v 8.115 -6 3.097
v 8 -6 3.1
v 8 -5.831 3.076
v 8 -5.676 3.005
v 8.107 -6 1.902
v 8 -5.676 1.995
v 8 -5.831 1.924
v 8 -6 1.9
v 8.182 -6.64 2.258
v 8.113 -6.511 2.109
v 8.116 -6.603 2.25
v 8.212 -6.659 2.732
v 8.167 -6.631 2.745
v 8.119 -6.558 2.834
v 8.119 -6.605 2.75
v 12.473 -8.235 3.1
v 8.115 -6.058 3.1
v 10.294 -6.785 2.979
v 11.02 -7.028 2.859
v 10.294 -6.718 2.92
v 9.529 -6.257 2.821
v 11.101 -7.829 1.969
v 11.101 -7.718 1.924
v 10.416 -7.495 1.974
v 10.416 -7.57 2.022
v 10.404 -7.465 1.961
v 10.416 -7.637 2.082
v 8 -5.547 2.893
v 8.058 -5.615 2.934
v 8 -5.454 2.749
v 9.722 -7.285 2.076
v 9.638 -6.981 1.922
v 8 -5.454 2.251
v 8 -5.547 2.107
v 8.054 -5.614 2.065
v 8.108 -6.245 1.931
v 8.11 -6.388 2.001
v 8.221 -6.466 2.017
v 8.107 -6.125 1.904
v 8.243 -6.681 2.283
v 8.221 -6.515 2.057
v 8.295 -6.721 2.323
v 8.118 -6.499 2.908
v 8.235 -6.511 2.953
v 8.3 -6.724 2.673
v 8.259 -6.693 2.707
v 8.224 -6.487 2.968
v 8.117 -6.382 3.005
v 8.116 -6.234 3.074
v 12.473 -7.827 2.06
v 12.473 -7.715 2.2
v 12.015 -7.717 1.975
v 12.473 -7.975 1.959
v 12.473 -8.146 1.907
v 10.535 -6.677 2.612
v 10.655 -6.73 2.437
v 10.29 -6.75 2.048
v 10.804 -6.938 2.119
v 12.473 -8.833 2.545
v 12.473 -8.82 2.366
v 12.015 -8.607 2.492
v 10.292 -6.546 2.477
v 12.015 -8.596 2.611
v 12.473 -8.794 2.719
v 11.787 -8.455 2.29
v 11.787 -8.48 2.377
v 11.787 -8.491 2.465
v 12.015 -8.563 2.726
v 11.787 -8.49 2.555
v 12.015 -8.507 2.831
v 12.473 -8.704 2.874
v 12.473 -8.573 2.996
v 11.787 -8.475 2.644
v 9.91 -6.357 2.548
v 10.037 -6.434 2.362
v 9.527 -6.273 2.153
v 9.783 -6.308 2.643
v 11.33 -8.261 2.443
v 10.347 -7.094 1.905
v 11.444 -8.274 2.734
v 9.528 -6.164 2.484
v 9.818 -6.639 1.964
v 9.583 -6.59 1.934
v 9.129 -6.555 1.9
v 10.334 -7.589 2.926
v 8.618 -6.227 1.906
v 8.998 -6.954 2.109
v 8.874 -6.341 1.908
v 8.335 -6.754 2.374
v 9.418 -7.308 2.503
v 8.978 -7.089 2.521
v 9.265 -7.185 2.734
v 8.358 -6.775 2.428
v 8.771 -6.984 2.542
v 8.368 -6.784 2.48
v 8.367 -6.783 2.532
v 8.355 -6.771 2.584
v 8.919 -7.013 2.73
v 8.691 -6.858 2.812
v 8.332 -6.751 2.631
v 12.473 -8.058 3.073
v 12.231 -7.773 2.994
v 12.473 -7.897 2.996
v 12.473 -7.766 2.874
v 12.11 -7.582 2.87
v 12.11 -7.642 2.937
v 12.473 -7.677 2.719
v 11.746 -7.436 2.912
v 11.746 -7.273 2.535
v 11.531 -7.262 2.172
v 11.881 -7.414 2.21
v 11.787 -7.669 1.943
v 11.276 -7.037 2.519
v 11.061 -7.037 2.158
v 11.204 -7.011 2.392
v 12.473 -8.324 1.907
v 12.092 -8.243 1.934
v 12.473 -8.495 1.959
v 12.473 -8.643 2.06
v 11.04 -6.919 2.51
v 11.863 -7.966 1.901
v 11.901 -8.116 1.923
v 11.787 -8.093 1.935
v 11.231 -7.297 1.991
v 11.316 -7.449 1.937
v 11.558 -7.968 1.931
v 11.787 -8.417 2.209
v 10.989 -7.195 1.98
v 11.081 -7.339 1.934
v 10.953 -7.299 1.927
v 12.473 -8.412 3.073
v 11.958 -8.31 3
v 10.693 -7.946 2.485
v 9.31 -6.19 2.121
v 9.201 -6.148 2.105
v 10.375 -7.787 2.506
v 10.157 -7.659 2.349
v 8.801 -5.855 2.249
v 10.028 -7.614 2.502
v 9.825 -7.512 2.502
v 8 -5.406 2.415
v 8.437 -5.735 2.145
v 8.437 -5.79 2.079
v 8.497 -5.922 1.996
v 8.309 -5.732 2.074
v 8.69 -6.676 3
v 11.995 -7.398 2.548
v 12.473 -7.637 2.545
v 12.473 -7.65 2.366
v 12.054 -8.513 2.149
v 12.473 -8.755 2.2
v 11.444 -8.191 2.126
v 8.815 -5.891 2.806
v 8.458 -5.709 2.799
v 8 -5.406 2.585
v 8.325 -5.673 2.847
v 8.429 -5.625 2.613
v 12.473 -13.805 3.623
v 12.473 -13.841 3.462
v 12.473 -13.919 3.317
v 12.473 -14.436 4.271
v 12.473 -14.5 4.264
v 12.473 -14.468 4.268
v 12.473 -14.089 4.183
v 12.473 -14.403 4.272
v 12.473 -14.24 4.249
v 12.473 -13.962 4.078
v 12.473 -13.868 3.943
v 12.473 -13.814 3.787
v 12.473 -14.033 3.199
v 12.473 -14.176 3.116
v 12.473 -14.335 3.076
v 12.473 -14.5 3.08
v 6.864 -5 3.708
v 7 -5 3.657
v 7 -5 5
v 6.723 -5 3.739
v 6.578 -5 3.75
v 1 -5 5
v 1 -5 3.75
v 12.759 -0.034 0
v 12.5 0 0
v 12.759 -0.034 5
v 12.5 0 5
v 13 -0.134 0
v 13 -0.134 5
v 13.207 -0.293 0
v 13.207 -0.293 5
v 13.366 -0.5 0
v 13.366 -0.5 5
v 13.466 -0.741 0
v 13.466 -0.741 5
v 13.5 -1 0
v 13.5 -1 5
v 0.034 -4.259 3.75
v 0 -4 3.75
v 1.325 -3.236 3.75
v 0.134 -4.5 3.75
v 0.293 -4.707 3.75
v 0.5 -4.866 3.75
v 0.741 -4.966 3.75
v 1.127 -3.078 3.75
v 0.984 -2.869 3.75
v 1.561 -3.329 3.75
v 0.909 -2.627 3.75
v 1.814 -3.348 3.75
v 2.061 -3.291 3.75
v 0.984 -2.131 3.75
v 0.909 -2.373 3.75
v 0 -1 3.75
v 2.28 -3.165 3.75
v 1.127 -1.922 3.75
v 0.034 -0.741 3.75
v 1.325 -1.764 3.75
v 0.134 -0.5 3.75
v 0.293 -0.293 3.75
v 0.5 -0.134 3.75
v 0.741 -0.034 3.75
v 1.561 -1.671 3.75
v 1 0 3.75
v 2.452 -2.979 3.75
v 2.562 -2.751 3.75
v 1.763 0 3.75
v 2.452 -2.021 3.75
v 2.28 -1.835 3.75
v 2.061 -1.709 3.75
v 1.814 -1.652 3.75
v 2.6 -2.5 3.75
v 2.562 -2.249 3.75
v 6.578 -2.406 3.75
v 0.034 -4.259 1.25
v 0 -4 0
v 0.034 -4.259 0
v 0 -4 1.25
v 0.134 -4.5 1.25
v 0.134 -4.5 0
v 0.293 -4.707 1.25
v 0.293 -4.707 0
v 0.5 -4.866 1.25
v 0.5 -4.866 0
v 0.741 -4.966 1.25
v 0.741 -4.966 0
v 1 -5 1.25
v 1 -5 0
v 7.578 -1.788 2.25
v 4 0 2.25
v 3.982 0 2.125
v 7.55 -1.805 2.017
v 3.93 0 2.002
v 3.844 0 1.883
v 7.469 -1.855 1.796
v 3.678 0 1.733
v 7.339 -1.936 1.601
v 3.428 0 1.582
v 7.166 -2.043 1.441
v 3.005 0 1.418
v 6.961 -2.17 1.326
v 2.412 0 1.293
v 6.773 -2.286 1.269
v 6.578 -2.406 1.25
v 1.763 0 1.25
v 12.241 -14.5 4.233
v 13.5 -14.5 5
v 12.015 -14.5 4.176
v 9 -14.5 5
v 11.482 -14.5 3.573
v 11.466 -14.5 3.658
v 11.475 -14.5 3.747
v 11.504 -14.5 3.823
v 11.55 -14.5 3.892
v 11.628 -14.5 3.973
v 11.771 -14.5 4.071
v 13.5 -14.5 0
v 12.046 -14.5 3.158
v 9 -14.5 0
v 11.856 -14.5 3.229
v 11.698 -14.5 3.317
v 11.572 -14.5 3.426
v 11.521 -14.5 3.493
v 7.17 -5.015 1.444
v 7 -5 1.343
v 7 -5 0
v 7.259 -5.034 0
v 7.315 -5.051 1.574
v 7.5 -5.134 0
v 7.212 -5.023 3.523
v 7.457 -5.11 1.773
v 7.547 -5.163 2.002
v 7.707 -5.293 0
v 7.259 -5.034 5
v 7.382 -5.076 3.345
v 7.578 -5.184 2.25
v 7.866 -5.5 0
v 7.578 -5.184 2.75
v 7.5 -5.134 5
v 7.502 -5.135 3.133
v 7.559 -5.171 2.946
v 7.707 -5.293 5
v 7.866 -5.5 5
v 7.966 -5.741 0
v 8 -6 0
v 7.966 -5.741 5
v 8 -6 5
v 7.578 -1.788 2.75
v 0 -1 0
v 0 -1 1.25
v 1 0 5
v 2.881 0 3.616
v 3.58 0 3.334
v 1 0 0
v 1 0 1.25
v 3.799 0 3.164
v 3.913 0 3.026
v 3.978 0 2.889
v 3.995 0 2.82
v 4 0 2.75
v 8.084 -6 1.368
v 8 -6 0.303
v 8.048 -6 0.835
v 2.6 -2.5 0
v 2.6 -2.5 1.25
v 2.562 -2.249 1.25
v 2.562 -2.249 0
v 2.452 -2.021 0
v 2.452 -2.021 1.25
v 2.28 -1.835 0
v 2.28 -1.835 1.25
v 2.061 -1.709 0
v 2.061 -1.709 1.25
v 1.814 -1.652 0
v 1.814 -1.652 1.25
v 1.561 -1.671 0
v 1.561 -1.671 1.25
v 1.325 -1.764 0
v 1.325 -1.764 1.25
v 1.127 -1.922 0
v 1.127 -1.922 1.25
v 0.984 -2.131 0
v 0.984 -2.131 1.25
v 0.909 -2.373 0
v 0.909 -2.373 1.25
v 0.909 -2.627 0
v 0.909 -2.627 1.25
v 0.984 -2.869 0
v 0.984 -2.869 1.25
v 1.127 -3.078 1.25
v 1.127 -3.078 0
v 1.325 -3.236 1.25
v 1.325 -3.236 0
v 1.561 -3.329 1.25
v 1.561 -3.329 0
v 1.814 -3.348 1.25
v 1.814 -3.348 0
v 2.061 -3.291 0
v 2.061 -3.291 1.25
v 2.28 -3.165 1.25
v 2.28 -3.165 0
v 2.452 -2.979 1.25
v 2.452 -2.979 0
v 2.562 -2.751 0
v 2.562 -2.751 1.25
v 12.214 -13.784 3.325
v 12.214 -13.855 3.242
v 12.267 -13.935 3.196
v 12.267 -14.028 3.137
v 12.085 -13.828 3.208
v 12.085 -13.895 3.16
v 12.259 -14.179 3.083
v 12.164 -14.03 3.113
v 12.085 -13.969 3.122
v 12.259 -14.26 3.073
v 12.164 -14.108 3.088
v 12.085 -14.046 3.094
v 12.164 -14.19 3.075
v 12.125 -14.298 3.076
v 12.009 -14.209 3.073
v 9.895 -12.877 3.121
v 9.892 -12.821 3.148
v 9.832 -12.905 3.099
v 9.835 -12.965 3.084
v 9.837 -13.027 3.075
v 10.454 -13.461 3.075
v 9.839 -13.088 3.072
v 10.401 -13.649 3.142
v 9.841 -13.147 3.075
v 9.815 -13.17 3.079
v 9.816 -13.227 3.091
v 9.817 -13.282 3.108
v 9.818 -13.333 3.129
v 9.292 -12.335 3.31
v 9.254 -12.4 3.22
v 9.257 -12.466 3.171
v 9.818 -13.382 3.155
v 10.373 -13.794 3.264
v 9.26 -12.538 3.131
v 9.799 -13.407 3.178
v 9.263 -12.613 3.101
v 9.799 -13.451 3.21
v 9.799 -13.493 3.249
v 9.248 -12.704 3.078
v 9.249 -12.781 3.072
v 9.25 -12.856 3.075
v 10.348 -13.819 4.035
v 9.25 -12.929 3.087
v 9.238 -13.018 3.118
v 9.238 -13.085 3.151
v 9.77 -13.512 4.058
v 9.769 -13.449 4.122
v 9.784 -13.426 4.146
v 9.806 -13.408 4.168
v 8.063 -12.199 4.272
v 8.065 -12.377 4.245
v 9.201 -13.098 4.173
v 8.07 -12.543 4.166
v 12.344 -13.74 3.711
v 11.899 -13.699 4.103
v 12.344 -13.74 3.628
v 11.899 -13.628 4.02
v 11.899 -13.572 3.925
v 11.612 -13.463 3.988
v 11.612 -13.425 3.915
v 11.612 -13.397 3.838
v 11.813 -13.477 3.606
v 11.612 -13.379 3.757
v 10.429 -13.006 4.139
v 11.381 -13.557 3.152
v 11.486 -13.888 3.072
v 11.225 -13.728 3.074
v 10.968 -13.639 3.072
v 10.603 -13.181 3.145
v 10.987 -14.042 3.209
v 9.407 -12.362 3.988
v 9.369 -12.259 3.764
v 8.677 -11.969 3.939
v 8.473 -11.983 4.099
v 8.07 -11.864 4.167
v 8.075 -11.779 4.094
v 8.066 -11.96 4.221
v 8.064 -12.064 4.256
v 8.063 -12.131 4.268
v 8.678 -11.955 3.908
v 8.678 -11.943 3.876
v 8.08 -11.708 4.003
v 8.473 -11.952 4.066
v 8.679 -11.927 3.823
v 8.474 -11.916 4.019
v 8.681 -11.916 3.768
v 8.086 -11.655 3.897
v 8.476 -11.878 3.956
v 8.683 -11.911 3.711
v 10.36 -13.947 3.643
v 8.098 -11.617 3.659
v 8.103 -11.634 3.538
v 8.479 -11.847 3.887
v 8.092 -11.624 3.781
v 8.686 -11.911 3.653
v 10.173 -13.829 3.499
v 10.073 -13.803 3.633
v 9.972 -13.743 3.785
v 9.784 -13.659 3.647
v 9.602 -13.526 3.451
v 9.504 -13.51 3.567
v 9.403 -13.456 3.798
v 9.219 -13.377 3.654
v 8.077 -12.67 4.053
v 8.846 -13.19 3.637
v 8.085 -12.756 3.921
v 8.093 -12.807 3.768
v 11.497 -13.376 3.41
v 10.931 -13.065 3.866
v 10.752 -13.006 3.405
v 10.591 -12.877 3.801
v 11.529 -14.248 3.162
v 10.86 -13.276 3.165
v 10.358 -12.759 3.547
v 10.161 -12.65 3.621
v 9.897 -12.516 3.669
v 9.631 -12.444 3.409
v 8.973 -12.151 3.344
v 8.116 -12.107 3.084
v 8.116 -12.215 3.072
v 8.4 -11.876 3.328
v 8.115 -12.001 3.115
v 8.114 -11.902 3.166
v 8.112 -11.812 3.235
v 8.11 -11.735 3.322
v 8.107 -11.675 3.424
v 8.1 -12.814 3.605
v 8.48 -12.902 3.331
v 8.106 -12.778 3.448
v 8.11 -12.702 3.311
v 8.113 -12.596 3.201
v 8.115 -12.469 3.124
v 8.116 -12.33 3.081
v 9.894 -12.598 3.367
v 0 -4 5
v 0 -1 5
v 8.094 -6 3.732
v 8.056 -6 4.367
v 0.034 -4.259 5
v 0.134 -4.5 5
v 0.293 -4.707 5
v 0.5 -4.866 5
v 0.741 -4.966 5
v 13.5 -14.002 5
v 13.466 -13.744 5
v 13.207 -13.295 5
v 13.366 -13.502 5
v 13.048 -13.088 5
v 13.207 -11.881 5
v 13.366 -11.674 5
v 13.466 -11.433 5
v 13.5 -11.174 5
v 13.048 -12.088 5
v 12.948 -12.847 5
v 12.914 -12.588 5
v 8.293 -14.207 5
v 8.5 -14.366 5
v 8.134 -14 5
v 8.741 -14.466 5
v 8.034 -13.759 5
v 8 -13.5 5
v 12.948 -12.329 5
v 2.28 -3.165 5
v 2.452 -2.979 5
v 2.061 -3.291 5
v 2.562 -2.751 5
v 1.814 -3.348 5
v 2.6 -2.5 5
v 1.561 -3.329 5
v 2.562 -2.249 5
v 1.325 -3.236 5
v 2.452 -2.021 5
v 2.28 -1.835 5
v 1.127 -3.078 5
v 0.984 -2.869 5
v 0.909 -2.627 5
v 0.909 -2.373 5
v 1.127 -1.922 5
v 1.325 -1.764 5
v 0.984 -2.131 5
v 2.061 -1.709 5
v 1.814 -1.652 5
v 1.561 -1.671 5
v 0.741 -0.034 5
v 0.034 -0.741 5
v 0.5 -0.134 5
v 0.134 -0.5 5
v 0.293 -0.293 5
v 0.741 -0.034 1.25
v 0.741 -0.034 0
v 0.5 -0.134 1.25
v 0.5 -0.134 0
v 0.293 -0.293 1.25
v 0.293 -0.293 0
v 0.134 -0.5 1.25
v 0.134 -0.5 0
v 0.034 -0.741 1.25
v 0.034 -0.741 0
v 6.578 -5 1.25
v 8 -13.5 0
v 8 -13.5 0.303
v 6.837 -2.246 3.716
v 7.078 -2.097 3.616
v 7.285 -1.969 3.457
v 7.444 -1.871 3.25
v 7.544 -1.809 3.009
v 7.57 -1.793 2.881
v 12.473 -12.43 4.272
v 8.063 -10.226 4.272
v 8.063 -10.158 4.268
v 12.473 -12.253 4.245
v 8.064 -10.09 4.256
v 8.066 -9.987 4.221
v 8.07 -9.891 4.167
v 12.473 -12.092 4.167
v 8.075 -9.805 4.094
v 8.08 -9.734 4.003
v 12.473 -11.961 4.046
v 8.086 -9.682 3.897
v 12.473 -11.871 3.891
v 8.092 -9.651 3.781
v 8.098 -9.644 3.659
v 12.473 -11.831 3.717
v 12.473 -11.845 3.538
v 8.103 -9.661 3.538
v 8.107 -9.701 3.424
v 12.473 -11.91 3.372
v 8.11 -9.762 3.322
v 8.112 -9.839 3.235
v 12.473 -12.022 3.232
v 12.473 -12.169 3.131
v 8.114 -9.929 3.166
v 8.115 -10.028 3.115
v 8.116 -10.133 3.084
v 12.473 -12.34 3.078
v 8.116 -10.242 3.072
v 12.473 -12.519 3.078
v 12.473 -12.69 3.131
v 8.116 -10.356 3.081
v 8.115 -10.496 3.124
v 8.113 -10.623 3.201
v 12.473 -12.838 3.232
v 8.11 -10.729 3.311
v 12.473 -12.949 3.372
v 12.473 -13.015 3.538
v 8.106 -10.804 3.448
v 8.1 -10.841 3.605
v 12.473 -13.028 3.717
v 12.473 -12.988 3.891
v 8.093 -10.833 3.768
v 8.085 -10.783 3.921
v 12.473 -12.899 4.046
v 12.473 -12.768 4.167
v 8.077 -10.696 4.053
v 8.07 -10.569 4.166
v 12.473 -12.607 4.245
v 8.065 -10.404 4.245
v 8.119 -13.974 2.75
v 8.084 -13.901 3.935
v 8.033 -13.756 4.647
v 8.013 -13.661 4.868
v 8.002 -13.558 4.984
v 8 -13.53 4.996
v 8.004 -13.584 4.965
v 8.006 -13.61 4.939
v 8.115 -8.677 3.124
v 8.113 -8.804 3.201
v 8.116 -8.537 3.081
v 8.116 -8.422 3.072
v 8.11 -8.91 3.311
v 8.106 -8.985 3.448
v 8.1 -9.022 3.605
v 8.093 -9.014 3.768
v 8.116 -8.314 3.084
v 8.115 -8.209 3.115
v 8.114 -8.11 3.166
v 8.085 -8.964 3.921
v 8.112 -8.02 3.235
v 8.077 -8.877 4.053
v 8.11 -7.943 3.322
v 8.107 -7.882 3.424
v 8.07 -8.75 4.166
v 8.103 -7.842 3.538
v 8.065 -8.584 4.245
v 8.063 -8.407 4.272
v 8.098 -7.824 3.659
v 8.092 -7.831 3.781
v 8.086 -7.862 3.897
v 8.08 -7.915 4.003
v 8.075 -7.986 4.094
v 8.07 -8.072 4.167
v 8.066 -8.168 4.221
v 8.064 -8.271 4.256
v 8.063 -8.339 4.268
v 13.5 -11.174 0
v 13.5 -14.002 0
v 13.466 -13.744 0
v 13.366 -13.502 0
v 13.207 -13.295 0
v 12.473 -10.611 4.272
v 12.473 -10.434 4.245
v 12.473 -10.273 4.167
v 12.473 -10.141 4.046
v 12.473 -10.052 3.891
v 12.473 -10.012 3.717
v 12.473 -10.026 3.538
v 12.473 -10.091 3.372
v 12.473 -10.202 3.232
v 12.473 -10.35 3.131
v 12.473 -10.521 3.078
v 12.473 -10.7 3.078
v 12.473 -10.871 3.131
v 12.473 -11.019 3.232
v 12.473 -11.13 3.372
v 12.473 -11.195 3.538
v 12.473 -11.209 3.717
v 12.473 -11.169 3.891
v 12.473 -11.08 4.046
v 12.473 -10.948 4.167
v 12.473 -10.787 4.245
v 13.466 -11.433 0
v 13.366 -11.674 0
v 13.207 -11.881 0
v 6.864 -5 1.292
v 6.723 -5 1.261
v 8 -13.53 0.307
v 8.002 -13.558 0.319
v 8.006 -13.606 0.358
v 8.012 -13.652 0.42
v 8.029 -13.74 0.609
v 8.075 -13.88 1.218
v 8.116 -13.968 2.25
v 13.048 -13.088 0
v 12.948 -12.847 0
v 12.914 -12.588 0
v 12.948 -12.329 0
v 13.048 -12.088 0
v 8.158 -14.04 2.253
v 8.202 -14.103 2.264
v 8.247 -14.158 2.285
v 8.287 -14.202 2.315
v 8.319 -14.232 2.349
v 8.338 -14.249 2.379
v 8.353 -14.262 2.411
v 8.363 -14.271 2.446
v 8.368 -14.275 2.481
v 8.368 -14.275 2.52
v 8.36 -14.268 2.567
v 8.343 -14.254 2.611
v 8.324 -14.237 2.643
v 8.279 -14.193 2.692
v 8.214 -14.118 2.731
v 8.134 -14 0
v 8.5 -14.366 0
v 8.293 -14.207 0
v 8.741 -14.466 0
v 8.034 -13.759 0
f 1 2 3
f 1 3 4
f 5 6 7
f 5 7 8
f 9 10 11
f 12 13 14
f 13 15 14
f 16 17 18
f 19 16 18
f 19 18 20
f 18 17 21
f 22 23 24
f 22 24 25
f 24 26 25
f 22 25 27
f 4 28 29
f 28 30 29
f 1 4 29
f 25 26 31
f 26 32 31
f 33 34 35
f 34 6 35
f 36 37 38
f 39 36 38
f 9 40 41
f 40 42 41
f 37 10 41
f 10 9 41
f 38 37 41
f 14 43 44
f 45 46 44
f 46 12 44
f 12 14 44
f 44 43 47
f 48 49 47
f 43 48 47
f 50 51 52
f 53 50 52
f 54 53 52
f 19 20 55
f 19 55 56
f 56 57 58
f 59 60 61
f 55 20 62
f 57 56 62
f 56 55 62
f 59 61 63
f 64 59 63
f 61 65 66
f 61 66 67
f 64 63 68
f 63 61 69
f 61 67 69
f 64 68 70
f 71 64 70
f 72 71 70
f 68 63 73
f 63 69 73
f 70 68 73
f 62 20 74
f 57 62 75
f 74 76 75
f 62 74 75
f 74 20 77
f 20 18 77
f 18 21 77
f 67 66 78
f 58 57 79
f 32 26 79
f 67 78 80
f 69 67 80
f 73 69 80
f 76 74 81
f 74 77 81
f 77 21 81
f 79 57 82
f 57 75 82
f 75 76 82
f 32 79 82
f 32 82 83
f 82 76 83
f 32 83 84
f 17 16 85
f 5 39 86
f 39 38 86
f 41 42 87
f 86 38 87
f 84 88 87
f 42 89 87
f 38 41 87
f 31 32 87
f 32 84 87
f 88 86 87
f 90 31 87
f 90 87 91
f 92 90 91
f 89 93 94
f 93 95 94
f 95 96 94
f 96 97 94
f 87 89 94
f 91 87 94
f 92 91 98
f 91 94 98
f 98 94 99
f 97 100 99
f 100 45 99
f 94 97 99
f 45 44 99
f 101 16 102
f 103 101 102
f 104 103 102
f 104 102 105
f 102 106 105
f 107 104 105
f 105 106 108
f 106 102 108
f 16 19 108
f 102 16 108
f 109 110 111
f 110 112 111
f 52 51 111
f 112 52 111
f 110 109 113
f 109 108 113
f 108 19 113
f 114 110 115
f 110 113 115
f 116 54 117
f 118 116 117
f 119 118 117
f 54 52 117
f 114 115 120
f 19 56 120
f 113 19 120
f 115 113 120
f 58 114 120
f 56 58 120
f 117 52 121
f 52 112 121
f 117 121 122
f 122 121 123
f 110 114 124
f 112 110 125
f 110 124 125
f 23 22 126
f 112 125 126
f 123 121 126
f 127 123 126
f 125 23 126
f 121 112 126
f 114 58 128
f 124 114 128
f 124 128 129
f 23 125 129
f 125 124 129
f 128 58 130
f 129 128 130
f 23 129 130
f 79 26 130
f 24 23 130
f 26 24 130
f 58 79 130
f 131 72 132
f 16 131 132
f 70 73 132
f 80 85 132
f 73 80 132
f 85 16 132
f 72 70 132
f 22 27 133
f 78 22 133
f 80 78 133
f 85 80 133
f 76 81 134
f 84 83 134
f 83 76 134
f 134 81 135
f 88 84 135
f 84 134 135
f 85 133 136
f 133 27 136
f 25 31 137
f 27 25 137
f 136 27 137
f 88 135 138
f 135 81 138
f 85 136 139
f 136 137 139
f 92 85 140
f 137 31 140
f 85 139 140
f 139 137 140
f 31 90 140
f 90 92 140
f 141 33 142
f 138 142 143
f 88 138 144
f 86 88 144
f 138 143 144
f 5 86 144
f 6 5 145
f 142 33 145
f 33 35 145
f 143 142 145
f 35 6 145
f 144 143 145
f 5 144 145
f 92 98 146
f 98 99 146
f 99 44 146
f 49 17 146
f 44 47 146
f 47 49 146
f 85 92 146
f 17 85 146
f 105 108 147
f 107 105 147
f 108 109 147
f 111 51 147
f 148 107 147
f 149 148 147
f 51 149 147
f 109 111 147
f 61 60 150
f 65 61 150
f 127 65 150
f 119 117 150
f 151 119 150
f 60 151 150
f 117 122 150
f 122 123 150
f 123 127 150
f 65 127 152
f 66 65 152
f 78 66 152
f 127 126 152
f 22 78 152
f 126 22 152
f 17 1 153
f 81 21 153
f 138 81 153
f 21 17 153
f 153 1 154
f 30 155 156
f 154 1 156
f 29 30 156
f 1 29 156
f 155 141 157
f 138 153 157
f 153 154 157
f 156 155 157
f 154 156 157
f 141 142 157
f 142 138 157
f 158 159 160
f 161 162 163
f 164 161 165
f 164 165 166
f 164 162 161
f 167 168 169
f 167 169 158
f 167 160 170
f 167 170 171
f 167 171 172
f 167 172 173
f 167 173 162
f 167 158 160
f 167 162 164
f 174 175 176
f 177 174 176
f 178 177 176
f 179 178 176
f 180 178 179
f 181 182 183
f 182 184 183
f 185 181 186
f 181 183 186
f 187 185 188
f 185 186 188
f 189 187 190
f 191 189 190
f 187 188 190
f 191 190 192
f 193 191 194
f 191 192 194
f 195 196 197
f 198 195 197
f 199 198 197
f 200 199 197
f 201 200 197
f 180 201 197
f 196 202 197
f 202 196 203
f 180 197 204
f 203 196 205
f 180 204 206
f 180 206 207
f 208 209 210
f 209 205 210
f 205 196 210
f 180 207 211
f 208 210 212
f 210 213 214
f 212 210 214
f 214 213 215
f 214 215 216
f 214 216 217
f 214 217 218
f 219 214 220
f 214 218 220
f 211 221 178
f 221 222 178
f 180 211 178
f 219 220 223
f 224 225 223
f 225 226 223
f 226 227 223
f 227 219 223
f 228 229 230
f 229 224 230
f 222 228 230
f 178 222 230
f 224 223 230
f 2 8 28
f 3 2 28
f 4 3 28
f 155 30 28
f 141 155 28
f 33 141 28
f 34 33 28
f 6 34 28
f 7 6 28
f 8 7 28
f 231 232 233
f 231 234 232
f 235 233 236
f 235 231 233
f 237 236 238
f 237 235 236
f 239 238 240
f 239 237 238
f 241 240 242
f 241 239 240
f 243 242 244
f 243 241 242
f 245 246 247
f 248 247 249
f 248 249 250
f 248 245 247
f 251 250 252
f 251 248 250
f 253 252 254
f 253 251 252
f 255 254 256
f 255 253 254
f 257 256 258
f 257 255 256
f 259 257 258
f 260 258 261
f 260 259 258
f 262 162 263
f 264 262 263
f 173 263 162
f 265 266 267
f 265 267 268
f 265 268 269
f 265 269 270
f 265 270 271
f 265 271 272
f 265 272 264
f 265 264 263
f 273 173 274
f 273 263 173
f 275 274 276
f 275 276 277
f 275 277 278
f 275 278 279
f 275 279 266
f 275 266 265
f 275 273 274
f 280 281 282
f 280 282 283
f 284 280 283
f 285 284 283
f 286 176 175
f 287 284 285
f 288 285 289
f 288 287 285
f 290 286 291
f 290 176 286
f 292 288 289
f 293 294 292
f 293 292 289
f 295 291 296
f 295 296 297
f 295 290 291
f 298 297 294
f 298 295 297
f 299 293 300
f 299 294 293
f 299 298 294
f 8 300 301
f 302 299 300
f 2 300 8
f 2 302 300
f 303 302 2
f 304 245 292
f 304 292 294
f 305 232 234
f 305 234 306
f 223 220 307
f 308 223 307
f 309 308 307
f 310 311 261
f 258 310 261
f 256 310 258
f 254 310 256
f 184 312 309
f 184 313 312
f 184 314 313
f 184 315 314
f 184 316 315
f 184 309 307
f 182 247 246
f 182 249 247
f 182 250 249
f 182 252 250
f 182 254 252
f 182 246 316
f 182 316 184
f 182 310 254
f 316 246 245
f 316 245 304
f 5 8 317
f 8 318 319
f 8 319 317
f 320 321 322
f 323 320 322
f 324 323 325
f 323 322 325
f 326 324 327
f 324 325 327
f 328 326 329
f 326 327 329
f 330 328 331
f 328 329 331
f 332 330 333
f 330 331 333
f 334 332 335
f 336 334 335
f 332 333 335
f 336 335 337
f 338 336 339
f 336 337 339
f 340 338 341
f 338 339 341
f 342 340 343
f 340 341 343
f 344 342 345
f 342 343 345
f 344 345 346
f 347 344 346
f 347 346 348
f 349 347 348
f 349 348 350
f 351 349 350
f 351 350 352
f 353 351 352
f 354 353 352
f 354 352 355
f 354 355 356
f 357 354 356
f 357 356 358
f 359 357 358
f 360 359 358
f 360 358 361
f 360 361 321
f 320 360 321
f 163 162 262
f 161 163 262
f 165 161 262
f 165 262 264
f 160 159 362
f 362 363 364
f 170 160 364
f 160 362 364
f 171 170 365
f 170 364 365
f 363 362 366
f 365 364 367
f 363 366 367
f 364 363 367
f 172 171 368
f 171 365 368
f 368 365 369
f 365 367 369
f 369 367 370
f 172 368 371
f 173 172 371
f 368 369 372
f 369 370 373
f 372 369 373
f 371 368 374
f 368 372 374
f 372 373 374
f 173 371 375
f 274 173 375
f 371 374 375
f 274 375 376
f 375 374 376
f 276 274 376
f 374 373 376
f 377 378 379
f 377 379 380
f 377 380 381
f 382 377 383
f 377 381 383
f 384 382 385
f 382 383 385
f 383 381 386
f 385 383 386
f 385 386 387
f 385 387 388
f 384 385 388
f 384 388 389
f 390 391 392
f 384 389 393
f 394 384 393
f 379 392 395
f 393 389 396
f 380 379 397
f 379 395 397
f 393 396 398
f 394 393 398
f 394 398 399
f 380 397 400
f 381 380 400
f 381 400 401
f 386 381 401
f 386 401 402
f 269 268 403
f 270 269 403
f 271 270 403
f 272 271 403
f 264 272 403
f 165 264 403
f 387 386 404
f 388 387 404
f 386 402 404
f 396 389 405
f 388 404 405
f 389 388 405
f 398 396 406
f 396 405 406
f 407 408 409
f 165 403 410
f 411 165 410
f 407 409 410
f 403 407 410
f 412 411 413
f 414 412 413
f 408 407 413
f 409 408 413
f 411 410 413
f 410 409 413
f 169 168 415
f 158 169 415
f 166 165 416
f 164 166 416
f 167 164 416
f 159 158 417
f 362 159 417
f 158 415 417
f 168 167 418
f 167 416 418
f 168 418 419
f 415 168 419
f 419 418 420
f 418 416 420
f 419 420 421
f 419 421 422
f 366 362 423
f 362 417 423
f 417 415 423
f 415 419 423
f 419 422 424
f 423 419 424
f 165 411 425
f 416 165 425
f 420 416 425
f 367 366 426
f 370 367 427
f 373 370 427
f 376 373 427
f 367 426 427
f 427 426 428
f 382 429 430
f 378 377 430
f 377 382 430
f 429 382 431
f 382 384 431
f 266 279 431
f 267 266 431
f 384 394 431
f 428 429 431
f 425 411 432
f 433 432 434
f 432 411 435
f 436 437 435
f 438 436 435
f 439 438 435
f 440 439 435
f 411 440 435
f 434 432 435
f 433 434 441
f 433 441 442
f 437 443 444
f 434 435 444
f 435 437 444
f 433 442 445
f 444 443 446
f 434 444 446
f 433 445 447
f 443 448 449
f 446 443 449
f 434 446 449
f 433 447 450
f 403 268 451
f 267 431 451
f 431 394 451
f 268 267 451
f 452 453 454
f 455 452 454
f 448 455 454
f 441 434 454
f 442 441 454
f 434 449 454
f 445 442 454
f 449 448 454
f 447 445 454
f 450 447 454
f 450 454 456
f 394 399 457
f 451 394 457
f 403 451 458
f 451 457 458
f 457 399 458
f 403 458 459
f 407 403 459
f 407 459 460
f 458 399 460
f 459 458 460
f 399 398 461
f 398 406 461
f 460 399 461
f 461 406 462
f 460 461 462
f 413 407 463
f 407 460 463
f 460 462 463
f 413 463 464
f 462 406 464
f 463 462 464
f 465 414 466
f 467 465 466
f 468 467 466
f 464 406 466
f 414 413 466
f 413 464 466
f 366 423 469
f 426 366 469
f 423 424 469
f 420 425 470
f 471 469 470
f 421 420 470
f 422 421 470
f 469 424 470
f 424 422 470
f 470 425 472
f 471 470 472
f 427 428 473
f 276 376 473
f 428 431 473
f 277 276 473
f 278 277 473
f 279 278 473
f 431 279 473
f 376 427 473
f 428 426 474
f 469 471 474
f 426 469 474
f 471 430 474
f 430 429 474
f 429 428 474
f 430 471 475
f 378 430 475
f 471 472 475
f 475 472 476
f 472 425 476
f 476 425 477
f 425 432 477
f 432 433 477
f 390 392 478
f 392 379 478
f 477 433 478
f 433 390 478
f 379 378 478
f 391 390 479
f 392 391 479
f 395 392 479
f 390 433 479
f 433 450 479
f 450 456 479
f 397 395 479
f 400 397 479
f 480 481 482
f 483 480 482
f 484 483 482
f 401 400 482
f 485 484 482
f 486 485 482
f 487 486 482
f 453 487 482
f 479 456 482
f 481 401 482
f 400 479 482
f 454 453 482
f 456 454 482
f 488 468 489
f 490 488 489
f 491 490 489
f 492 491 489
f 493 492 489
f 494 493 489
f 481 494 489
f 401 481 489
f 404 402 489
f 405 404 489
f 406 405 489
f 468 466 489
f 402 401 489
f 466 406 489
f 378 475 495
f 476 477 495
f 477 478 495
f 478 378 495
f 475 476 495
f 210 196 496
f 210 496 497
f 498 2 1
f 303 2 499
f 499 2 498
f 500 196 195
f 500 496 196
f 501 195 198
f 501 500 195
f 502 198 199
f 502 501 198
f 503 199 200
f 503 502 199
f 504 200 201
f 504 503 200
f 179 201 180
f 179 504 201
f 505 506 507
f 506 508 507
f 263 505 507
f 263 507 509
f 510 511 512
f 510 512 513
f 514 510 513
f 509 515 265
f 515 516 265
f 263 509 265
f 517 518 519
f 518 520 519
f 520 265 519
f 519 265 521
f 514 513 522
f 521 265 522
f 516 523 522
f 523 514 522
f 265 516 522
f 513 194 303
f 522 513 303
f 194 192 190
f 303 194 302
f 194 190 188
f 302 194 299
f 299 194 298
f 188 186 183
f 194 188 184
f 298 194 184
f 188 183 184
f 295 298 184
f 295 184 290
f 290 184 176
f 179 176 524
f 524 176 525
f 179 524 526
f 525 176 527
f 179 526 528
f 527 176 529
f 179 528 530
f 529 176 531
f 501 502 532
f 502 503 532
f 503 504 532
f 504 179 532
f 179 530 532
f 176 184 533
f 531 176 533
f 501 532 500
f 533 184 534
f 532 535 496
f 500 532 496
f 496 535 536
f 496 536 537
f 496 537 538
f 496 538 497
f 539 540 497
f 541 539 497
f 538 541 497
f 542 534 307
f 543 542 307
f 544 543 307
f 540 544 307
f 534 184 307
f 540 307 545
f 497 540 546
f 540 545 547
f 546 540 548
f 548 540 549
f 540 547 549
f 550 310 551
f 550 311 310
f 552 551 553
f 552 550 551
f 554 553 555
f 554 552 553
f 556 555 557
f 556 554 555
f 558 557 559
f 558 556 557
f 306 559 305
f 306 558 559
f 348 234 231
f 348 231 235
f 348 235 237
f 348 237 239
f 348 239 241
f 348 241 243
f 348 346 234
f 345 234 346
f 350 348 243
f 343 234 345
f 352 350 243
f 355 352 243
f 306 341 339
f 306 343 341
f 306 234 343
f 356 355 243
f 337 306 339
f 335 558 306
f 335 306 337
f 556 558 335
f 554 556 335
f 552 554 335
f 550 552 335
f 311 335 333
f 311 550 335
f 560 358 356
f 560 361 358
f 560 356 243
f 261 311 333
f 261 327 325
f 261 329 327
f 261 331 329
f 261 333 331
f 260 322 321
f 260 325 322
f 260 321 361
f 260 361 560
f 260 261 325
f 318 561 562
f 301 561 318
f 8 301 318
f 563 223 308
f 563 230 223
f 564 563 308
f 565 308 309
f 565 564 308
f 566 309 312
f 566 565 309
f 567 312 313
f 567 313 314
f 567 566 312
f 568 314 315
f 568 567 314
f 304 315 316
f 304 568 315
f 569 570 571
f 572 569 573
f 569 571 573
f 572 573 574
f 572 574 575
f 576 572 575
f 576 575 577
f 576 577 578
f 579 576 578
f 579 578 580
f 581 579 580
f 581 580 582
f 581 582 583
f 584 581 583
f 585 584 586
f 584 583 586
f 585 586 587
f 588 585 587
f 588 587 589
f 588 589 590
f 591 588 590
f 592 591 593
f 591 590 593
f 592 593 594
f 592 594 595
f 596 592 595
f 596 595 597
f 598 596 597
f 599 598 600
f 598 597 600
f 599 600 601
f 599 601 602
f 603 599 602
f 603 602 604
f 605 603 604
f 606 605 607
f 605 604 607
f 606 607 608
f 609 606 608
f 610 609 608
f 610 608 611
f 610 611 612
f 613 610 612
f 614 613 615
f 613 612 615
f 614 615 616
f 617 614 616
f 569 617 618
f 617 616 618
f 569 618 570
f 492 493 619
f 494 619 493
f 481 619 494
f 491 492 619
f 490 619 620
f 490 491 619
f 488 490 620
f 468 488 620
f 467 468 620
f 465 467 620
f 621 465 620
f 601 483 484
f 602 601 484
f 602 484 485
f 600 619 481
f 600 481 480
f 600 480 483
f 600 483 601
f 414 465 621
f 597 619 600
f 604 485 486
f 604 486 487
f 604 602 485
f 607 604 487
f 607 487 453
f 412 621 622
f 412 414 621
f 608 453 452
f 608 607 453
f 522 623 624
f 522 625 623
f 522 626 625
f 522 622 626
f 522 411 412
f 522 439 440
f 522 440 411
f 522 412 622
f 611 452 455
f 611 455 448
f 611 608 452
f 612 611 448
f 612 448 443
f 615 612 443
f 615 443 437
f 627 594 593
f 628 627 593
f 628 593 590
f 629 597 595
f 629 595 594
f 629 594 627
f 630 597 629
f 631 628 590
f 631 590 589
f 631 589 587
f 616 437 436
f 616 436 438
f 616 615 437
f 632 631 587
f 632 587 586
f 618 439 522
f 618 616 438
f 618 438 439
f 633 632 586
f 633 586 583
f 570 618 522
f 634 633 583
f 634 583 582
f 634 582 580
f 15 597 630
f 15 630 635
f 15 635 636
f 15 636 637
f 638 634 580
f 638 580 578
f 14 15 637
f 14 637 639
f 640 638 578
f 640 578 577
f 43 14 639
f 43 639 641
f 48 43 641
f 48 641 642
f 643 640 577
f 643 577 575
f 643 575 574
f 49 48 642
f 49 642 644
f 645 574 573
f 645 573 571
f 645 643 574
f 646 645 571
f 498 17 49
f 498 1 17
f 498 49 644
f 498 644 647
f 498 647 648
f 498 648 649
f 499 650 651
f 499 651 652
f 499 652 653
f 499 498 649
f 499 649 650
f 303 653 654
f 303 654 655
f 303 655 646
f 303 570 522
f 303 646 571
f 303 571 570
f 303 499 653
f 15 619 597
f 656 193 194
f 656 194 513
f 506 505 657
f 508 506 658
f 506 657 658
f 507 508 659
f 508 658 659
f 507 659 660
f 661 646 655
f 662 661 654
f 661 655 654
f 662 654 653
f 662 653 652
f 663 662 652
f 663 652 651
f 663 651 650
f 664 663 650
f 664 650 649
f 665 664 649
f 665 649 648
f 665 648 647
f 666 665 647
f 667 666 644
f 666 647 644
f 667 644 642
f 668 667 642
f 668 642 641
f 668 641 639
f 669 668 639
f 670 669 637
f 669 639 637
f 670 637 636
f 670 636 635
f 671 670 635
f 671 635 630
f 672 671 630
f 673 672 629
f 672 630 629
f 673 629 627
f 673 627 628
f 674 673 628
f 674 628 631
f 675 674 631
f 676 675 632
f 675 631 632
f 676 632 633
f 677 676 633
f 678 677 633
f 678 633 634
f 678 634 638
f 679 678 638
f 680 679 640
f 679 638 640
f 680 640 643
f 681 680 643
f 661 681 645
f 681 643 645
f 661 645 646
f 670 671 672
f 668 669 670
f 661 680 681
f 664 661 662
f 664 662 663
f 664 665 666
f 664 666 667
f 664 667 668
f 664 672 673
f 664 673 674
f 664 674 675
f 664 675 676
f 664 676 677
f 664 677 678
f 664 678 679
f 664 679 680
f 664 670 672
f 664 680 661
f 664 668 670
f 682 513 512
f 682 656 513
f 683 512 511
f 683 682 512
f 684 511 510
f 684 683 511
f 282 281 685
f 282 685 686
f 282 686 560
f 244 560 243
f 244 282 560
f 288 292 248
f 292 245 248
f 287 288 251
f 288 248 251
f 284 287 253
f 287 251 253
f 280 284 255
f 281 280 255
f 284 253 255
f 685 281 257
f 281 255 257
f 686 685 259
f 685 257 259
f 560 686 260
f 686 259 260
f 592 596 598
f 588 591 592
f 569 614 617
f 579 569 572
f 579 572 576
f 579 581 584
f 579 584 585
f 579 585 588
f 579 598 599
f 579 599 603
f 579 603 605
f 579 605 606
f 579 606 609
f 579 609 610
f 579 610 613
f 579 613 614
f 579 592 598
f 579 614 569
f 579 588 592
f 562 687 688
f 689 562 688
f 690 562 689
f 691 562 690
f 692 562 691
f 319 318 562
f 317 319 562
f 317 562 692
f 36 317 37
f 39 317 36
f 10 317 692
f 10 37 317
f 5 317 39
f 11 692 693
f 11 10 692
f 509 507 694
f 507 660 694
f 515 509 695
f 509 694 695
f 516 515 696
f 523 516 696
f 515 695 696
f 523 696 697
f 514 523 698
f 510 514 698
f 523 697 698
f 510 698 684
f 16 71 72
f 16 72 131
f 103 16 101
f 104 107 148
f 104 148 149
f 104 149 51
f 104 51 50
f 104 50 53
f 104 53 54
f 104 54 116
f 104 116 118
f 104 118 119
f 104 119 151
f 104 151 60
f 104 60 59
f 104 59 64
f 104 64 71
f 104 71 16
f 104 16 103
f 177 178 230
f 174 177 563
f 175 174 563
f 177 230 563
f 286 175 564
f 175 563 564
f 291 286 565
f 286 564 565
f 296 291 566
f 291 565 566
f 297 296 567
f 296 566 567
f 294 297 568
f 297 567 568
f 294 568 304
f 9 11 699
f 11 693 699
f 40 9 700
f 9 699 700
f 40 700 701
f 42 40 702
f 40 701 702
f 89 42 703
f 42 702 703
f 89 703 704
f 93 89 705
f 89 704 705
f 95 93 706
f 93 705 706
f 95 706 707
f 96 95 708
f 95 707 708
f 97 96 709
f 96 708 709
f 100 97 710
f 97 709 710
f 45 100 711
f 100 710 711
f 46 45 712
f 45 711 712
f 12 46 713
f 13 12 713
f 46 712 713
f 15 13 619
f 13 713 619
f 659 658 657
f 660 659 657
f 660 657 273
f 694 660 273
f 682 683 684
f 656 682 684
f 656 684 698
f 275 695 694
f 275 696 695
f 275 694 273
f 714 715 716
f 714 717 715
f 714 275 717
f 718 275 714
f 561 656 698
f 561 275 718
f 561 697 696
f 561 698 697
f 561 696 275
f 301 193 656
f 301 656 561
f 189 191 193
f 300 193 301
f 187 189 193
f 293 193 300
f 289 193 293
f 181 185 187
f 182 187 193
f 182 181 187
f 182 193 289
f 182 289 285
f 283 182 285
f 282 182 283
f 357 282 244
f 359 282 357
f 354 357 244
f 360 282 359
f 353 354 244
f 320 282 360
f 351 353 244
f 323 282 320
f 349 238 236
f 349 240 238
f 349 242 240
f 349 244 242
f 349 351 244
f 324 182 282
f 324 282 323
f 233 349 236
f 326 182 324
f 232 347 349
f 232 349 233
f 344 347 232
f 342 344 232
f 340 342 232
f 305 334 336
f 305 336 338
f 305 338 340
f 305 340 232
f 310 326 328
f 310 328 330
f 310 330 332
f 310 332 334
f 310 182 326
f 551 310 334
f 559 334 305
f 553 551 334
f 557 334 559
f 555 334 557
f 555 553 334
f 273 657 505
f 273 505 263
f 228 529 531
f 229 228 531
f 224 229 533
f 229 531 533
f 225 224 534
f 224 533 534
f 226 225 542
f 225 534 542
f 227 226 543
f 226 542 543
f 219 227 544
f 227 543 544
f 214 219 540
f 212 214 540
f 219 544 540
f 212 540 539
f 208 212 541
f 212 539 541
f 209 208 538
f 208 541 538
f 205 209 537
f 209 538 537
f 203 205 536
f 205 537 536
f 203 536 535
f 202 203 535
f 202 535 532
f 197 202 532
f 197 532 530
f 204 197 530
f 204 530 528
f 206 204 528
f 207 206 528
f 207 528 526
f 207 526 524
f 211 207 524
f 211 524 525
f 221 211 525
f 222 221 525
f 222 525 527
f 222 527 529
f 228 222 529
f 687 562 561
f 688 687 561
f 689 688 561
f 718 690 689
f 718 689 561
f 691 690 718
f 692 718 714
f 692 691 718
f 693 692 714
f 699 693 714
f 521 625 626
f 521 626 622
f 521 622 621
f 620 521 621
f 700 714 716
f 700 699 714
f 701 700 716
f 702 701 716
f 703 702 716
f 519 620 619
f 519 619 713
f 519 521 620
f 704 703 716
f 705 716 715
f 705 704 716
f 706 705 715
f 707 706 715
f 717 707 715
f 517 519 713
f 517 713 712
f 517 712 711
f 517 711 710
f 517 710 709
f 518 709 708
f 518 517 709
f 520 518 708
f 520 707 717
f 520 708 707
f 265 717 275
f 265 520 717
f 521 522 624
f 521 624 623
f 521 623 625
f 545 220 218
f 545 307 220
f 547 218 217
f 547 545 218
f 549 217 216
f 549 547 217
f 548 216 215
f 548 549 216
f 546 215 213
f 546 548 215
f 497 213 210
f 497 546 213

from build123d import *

# Parameters (mm, degrees)
BOSS_EXTRUDE1_DEPTH = 5
SKETCH4_R           = 0.85
CUT_EXTRUDE3_DEPTH  = 21.432816742
SKETCH5_W           = 4
SKETCH5_H           = 2.5
CUT_EXTRUDE4_DEPTH  = 13
FILLET4_R           = 1
CUT_EXTRUDE5_DEPTH  = 21.432816742
FILLET6_R           = 1
CUT_EXTRUDE6_START  = -8.5
CUT_EXTRUDE6_DEPTH  = 7.974174509
SKETCH11_W          = 2.5
SKETCH11_H          = 5
CUT_EXTRUDE8_DEPTH  = 4
SKETCH12_R          = 0.6
CUT_EXTRUDE9_DEPTH  = 5
SKETCH9_R           = 0.25
CUT_EXTRUDE10_DEPTH = 8.5
FILLET7_R           = 1


# Read off the part's stored shape, not the designer's step: Cut-Extrude6
with BuildPart() as part:
    # Sketch1 → Boss-Extrude1 (new body)
    with BuildSketch(Plane.XY):
        Polygon((0, 0), (13.5, 0), (13.5, -14.5), (8, -14.5), (8, -5), (0, -5), align=None)
    extrude(amount=BOSS_EXTRUDE1_DEPTH)

    # Sketch4 → Cut-Extrude3 (cut, through all)
    with BuildSketch(Plane.XY.offset(5)):
        with Locations((1.75, -2.5)):
            Circle(SKETCH4_R)
    extrude(amount=-CUT_EXTRUDE3_DEPTH, mode=Mode.SUBTRACT)

    # Sketch5 → Cut-Extrude4 (cut)
    with BuildSketch(Plane(origin=(0, 0, 0), x_dir=(1, 0, 0), z_dir=(0, 1, 0))):
        with Locations((2, -2.5)):
            Rectangle(SKETCH5_W, SKETCH5_H)
    extrude(amount=-CUT_EXTRUDE4_DEPTH, mode=Mode.SUBTRACT)

    # Fillet4
    fillet4_edges = [part.edges().sort_by_distance(p)[0] for p in [
        (0, 0, 4.375),
        (0, -5, 4.375),
        (0, 0, 0.625),
        (0, -5, 0.625),
    ]]
    fillet(fillet4_edges, radius=FILLET4_R)

    # Sketch6 → Cut-Extrude5 (cut, through all)
    with BuildSketch(Plane.XY.offset(5)):
        Polygon((13.5, -13.588182425), (12.5, -12.588182425), (13.5, -11.588182425), align=None)
    extrude(amount=-CUT_EXTRUDE5_DEPTH, mode=Mode.SUBTRACT)

    # Fillet6
    fillet6_edges = [part.edges().sort_by_distance(p)[0] for p in [
        (12.5, -12.588182425, 2.5),
        (13.5, -13.588182425, 2.5),
        (13.5, -11.588182425, 2.5),
        (8, -5, 2.5),
        (8, -14.5, 2.5),
        (13.5, 0, 2.5),
    ]]
    fillet(fillet6_edges, radius=FILLET6_R - 0.0001)  # a hair under: the kernel refuses the full size

    # Cut-Extrude6 outline → Cut-Extrude6 (cut)
    with BuildSketch(Plane.XZ.offset(14.5).offset(CUT_EXTRUDE6_START)):
        with BuildLine():
            Line((7.999994957, 5.000049402), (7.999994964, 0.302944212))
            ThreePointArc((7.999994964, 0.302944212), (8.119562434, 2.651496807), (7.999994957, 5.000049402))
        make_face()
    extrude(amount=CUT_EXTRUDE6_DEPTH, mode=Mode.SUBTRACT)

    # Sketch11 → Cut-Extrude8 (cut, along a direction that is not the sketch's normal)
    with BuildSketch(Plane.ZY.offset(-4)):
        with Locations((2.5, -2.5)):
            Rectangle(SKETCH11_W, SKETCH11_H)
    extrude(amount=-CUT_EXTRUDE8_DEPTH, dir=(-0.894528038262942, 0.4470118440952684, 0), mode=Mode.SUBTRACT)

    # Sketch12 → Cut-Extrude9 (cut, along a direction that is not the sketch's normal)
    with BuildSketch(Plane.ZY.offset(-8)):
        with Locations((3.671694189, -8.375443102)):
            Circle(SKETCH12_R)
        with Locations((3.671694189, -10.194652501)):
            Circle(SKETCH12_R)
        with Locations((3.671694189, -12.168032187)):
            Circle(SKETCH12_R)
        with Locations((2.5, -6)):
            Circle(SKETCH12_R)
    extrude(amount=-CUT_EXTRUDE9_DEPTH, dir=(-0.894528038262942, 0.4470118440952684, 0), mode=Mode.SUBTRACT)

    # Sketch9 → Cut-Extrude10 (cut)
    with BuildSketch(Plane.XZ.offset(14.5)):
        with Locations((8.119066185, 2.5)):
            Circle(SKETCH9_R)
    extrude(amount=-CUT_EXTRUDE10_DEPTH, mode=Mode.SUBTRACT)

    # Fillet7
    fillet7_edges = [part.edges().sort_by_distance(p)[0] for p in [
        (5.789056077, -0.894023688, 1.25),
        (5.789056077, -0.894023688, 3.75),
        (7.578112153, -3.486020884, 3.75),
        (7.578112153, -3.486020884, 1.25),
    ]]
    fillet(fillet7_edges, radius=FILLET7_R)


solid = part.part
